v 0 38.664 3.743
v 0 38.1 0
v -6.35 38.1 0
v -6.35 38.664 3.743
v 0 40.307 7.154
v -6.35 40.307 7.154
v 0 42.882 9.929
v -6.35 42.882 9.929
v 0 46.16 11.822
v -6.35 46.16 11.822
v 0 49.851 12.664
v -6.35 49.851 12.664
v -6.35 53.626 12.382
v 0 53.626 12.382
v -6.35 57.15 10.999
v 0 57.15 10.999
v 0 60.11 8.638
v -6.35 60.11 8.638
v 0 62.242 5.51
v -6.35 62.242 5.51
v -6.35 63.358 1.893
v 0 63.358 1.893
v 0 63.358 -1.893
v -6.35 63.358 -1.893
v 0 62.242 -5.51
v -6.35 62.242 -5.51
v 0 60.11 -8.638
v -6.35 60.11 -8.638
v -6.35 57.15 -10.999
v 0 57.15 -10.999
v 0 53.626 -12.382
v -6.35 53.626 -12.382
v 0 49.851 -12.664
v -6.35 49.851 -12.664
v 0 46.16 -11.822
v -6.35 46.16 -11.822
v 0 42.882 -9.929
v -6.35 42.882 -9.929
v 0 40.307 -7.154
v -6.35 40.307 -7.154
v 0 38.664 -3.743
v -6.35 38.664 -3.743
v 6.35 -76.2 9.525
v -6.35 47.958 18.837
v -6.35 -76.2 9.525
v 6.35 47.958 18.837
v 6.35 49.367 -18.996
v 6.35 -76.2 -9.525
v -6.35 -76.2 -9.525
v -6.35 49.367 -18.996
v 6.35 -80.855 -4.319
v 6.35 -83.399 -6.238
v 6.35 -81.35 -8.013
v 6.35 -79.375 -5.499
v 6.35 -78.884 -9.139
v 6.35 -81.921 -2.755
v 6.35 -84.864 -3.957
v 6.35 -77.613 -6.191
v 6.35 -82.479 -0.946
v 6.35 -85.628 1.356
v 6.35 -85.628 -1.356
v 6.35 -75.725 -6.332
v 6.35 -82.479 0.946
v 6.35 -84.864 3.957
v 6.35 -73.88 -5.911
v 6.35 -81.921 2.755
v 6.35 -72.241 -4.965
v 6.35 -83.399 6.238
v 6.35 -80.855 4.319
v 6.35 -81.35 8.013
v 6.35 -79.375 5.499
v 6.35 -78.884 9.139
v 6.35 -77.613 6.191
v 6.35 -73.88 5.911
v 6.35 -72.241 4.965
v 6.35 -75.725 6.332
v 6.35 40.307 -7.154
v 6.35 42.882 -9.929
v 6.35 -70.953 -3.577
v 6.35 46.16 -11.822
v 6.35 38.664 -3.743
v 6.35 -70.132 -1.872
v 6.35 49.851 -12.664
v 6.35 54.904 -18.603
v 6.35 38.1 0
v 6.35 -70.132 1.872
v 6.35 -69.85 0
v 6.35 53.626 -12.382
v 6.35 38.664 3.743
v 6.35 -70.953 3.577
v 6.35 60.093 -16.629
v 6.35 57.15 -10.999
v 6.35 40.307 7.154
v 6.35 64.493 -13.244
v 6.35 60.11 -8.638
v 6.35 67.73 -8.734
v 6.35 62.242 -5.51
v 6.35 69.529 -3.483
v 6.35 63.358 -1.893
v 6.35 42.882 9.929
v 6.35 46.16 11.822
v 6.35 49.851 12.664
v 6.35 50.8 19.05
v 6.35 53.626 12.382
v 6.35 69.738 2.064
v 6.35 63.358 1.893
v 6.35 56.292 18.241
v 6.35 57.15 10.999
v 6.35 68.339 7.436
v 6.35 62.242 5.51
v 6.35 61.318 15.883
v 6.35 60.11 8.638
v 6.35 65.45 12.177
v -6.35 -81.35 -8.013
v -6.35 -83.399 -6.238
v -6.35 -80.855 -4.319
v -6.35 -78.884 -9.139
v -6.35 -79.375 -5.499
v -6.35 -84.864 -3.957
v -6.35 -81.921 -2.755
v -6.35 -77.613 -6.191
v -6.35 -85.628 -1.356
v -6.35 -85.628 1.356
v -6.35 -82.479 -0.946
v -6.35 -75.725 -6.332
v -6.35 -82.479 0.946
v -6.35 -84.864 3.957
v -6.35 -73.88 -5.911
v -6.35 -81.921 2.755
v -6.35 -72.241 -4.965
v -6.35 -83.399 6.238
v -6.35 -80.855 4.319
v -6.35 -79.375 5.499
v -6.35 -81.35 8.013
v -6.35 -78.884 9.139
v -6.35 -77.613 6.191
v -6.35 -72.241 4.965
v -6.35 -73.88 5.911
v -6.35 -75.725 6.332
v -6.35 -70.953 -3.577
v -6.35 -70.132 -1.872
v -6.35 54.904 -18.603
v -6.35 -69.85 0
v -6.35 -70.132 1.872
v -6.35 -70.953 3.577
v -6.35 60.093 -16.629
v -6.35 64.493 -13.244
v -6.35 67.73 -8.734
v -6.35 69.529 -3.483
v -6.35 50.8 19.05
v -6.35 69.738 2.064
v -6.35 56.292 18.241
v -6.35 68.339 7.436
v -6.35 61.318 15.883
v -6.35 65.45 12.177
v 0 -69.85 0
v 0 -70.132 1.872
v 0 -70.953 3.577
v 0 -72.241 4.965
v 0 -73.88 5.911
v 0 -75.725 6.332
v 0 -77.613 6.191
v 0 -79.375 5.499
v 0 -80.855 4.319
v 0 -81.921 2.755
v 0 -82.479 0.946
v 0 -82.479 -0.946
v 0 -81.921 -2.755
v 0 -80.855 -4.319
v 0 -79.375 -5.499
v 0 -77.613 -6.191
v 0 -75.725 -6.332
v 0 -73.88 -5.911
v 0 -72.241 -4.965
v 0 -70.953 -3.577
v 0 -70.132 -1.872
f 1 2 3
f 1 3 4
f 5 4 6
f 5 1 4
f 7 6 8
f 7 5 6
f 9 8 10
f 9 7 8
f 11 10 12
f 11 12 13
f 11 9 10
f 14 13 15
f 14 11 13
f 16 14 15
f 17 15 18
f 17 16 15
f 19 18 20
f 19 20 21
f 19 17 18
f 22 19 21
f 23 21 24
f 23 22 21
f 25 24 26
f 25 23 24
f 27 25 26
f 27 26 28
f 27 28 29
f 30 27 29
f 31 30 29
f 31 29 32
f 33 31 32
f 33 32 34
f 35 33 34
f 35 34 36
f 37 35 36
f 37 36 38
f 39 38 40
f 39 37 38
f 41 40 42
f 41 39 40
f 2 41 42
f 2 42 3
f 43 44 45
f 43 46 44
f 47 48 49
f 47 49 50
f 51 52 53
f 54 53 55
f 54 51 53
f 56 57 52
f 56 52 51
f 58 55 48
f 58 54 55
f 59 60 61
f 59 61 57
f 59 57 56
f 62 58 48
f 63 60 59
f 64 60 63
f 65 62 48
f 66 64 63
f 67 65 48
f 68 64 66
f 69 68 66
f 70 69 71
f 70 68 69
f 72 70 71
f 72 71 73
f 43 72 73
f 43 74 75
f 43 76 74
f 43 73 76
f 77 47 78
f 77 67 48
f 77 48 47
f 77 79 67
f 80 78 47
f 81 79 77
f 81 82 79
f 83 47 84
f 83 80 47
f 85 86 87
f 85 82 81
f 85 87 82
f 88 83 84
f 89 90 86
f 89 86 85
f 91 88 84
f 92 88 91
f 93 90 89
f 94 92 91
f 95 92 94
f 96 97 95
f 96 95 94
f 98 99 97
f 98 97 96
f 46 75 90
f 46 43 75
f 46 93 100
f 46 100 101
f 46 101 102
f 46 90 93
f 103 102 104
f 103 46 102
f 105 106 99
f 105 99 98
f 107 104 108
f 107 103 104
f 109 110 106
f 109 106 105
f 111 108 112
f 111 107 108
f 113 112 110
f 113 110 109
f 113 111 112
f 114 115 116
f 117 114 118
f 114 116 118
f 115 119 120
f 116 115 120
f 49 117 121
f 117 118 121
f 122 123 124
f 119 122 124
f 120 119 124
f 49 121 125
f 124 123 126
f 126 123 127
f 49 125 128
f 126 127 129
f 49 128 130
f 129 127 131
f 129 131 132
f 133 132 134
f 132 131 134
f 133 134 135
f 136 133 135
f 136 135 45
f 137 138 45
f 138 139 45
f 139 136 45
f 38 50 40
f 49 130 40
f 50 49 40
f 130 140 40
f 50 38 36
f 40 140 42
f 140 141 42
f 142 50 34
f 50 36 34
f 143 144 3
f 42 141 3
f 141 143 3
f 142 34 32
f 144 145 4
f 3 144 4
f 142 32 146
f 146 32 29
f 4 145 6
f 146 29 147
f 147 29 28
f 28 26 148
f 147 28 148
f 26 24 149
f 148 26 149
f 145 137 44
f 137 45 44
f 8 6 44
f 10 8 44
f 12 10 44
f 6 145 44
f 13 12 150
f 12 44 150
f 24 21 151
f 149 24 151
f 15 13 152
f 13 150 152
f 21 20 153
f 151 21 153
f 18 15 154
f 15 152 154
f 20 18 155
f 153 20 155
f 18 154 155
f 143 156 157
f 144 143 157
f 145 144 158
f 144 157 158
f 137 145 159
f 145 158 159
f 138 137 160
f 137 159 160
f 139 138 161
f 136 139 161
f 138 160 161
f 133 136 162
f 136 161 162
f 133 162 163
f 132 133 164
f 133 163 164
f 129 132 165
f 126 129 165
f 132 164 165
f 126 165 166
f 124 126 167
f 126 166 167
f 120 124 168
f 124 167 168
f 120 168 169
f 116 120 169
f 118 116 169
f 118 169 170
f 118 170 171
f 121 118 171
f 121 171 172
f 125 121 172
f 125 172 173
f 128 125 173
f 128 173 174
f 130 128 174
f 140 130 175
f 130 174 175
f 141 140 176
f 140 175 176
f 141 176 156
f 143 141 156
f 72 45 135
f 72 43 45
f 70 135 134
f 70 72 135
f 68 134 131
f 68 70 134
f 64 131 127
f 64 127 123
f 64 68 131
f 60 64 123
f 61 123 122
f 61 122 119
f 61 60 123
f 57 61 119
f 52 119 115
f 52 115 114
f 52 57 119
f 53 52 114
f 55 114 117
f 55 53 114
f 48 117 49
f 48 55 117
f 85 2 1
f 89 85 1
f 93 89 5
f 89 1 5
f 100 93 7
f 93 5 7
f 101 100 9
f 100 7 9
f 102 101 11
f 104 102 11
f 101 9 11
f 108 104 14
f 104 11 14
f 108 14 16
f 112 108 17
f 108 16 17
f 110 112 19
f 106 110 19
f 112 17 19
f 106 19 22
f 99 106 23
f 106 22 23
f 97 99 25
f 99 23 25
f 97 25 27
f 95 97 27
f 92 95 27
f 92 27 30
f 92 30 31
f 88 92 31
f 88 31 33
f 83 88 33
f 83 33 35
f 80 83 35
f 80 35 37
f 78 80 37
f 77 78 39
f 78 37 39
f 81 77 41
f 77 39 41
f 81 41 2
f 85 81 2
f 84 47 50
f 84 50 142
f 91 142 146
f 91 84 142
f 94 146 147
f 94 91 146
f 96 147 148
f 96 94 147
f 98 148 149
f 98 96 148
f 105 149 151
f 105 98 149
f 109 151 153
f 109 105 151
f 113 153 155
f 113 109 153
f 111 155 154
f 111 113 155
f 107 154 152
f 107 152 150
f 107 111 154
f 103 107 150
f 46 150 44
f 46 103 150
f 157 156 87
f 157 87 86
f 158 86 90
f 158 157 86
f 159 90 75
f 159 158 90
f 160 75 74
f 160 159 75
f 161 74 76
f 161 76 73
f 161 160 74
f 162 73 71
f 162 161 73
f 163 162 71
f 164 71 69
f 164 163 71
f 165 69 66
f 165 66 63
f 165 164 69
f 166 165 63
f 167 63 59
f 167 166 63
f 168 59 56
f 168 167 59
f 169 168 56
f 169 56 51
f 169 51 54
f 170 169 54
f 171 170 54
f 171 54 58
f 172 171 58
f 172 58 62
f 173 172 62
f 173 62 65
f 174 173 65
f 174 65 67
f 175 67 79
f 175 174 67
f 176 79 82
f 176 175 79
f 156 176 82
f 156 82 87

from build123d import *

# Parameters (mm, degrees)
F0_R     = 6.35
F1_DEPTH = 6.35


with BuildPart() as f1:
    # F0 (on Right) → F1 (new body, symmetric)
    with BuildSketch(Plane.YZ):
        with BuildLine():
            ThreePointArc((-76.2, -9.525), (-69.4648079092, -6.7351920908), (-66.675, 0))
            ThreePointArc((-66.675, 0), (-69.4648079092, 6.7351920908), (-76.2, 9.525))
            ThreePointArc((-76.2, 9.525), (-85.725, 0), (-76.2, -9.525))
        make_face()
        with Locations((-76.2, 0)):
            Circle(F0_R, mode=Mode.SUBTRACT)
        with BuildLine():
            ThreePointArc((-76.2, 9.525), (-69.4648079092, 6.7351920908), (-66.675, 0))
            Line((-66.675, 0), (31.75, 0))
            ThreePointArc((31.75, 0), (36.3598928544, 12.4252084741), (47.9584835301, 18.8368862648))
            Line((47.9584835301, 18.8368862648), (-76.2, 9.525))
        make_face()
        with BuildLine():
            Line((31.75, 0), (-66.675, 0))
            ThreePointArc((-66.675, 0), (-69.4648079092, -6.7351920908), (-76.2, -9.525))
            Line((-76.2, -9.525), (49.3672031886, -18.9960415165))
            ThreePointArc((49.3672031886, -18.9960415165), (36.8322285375, -12.9539129367), (31.75, 0))
        make_face()
        with BuildLine():
            ThreePointArc((47.9584835301, 18.8368862648), (36.3598928544, 12.4252084741), (31.75, 0))
            ThreePointArc((31.75, 0), (36.8322285375, -12.9539129367), (49.3672031886, -18.9960415165))
            ThreePointArc((49.3672031886, -18.9960415165), (63.7539129367, -13.9677714625), (69.85, 0))
            ThreePointArc((69.85, 0), (64.2703841816, 13.4703841816), (50.8, 19.05))
            Line((50.8, 19.05), (47.9584835301, 18.8368862648))
        make_face()
        with BuildLine():
            ThreePointArc((63.5, 0), (50.8, -12.7), (38.1, 0))
            ThreePointArc((38.1, 0), (50.8, 12.7), (63.5, 0))
        make_face(mode=Mode.SUBTRACT)
    extrude(amount=F1_DEPTH, both=True)


solid = f1.part
